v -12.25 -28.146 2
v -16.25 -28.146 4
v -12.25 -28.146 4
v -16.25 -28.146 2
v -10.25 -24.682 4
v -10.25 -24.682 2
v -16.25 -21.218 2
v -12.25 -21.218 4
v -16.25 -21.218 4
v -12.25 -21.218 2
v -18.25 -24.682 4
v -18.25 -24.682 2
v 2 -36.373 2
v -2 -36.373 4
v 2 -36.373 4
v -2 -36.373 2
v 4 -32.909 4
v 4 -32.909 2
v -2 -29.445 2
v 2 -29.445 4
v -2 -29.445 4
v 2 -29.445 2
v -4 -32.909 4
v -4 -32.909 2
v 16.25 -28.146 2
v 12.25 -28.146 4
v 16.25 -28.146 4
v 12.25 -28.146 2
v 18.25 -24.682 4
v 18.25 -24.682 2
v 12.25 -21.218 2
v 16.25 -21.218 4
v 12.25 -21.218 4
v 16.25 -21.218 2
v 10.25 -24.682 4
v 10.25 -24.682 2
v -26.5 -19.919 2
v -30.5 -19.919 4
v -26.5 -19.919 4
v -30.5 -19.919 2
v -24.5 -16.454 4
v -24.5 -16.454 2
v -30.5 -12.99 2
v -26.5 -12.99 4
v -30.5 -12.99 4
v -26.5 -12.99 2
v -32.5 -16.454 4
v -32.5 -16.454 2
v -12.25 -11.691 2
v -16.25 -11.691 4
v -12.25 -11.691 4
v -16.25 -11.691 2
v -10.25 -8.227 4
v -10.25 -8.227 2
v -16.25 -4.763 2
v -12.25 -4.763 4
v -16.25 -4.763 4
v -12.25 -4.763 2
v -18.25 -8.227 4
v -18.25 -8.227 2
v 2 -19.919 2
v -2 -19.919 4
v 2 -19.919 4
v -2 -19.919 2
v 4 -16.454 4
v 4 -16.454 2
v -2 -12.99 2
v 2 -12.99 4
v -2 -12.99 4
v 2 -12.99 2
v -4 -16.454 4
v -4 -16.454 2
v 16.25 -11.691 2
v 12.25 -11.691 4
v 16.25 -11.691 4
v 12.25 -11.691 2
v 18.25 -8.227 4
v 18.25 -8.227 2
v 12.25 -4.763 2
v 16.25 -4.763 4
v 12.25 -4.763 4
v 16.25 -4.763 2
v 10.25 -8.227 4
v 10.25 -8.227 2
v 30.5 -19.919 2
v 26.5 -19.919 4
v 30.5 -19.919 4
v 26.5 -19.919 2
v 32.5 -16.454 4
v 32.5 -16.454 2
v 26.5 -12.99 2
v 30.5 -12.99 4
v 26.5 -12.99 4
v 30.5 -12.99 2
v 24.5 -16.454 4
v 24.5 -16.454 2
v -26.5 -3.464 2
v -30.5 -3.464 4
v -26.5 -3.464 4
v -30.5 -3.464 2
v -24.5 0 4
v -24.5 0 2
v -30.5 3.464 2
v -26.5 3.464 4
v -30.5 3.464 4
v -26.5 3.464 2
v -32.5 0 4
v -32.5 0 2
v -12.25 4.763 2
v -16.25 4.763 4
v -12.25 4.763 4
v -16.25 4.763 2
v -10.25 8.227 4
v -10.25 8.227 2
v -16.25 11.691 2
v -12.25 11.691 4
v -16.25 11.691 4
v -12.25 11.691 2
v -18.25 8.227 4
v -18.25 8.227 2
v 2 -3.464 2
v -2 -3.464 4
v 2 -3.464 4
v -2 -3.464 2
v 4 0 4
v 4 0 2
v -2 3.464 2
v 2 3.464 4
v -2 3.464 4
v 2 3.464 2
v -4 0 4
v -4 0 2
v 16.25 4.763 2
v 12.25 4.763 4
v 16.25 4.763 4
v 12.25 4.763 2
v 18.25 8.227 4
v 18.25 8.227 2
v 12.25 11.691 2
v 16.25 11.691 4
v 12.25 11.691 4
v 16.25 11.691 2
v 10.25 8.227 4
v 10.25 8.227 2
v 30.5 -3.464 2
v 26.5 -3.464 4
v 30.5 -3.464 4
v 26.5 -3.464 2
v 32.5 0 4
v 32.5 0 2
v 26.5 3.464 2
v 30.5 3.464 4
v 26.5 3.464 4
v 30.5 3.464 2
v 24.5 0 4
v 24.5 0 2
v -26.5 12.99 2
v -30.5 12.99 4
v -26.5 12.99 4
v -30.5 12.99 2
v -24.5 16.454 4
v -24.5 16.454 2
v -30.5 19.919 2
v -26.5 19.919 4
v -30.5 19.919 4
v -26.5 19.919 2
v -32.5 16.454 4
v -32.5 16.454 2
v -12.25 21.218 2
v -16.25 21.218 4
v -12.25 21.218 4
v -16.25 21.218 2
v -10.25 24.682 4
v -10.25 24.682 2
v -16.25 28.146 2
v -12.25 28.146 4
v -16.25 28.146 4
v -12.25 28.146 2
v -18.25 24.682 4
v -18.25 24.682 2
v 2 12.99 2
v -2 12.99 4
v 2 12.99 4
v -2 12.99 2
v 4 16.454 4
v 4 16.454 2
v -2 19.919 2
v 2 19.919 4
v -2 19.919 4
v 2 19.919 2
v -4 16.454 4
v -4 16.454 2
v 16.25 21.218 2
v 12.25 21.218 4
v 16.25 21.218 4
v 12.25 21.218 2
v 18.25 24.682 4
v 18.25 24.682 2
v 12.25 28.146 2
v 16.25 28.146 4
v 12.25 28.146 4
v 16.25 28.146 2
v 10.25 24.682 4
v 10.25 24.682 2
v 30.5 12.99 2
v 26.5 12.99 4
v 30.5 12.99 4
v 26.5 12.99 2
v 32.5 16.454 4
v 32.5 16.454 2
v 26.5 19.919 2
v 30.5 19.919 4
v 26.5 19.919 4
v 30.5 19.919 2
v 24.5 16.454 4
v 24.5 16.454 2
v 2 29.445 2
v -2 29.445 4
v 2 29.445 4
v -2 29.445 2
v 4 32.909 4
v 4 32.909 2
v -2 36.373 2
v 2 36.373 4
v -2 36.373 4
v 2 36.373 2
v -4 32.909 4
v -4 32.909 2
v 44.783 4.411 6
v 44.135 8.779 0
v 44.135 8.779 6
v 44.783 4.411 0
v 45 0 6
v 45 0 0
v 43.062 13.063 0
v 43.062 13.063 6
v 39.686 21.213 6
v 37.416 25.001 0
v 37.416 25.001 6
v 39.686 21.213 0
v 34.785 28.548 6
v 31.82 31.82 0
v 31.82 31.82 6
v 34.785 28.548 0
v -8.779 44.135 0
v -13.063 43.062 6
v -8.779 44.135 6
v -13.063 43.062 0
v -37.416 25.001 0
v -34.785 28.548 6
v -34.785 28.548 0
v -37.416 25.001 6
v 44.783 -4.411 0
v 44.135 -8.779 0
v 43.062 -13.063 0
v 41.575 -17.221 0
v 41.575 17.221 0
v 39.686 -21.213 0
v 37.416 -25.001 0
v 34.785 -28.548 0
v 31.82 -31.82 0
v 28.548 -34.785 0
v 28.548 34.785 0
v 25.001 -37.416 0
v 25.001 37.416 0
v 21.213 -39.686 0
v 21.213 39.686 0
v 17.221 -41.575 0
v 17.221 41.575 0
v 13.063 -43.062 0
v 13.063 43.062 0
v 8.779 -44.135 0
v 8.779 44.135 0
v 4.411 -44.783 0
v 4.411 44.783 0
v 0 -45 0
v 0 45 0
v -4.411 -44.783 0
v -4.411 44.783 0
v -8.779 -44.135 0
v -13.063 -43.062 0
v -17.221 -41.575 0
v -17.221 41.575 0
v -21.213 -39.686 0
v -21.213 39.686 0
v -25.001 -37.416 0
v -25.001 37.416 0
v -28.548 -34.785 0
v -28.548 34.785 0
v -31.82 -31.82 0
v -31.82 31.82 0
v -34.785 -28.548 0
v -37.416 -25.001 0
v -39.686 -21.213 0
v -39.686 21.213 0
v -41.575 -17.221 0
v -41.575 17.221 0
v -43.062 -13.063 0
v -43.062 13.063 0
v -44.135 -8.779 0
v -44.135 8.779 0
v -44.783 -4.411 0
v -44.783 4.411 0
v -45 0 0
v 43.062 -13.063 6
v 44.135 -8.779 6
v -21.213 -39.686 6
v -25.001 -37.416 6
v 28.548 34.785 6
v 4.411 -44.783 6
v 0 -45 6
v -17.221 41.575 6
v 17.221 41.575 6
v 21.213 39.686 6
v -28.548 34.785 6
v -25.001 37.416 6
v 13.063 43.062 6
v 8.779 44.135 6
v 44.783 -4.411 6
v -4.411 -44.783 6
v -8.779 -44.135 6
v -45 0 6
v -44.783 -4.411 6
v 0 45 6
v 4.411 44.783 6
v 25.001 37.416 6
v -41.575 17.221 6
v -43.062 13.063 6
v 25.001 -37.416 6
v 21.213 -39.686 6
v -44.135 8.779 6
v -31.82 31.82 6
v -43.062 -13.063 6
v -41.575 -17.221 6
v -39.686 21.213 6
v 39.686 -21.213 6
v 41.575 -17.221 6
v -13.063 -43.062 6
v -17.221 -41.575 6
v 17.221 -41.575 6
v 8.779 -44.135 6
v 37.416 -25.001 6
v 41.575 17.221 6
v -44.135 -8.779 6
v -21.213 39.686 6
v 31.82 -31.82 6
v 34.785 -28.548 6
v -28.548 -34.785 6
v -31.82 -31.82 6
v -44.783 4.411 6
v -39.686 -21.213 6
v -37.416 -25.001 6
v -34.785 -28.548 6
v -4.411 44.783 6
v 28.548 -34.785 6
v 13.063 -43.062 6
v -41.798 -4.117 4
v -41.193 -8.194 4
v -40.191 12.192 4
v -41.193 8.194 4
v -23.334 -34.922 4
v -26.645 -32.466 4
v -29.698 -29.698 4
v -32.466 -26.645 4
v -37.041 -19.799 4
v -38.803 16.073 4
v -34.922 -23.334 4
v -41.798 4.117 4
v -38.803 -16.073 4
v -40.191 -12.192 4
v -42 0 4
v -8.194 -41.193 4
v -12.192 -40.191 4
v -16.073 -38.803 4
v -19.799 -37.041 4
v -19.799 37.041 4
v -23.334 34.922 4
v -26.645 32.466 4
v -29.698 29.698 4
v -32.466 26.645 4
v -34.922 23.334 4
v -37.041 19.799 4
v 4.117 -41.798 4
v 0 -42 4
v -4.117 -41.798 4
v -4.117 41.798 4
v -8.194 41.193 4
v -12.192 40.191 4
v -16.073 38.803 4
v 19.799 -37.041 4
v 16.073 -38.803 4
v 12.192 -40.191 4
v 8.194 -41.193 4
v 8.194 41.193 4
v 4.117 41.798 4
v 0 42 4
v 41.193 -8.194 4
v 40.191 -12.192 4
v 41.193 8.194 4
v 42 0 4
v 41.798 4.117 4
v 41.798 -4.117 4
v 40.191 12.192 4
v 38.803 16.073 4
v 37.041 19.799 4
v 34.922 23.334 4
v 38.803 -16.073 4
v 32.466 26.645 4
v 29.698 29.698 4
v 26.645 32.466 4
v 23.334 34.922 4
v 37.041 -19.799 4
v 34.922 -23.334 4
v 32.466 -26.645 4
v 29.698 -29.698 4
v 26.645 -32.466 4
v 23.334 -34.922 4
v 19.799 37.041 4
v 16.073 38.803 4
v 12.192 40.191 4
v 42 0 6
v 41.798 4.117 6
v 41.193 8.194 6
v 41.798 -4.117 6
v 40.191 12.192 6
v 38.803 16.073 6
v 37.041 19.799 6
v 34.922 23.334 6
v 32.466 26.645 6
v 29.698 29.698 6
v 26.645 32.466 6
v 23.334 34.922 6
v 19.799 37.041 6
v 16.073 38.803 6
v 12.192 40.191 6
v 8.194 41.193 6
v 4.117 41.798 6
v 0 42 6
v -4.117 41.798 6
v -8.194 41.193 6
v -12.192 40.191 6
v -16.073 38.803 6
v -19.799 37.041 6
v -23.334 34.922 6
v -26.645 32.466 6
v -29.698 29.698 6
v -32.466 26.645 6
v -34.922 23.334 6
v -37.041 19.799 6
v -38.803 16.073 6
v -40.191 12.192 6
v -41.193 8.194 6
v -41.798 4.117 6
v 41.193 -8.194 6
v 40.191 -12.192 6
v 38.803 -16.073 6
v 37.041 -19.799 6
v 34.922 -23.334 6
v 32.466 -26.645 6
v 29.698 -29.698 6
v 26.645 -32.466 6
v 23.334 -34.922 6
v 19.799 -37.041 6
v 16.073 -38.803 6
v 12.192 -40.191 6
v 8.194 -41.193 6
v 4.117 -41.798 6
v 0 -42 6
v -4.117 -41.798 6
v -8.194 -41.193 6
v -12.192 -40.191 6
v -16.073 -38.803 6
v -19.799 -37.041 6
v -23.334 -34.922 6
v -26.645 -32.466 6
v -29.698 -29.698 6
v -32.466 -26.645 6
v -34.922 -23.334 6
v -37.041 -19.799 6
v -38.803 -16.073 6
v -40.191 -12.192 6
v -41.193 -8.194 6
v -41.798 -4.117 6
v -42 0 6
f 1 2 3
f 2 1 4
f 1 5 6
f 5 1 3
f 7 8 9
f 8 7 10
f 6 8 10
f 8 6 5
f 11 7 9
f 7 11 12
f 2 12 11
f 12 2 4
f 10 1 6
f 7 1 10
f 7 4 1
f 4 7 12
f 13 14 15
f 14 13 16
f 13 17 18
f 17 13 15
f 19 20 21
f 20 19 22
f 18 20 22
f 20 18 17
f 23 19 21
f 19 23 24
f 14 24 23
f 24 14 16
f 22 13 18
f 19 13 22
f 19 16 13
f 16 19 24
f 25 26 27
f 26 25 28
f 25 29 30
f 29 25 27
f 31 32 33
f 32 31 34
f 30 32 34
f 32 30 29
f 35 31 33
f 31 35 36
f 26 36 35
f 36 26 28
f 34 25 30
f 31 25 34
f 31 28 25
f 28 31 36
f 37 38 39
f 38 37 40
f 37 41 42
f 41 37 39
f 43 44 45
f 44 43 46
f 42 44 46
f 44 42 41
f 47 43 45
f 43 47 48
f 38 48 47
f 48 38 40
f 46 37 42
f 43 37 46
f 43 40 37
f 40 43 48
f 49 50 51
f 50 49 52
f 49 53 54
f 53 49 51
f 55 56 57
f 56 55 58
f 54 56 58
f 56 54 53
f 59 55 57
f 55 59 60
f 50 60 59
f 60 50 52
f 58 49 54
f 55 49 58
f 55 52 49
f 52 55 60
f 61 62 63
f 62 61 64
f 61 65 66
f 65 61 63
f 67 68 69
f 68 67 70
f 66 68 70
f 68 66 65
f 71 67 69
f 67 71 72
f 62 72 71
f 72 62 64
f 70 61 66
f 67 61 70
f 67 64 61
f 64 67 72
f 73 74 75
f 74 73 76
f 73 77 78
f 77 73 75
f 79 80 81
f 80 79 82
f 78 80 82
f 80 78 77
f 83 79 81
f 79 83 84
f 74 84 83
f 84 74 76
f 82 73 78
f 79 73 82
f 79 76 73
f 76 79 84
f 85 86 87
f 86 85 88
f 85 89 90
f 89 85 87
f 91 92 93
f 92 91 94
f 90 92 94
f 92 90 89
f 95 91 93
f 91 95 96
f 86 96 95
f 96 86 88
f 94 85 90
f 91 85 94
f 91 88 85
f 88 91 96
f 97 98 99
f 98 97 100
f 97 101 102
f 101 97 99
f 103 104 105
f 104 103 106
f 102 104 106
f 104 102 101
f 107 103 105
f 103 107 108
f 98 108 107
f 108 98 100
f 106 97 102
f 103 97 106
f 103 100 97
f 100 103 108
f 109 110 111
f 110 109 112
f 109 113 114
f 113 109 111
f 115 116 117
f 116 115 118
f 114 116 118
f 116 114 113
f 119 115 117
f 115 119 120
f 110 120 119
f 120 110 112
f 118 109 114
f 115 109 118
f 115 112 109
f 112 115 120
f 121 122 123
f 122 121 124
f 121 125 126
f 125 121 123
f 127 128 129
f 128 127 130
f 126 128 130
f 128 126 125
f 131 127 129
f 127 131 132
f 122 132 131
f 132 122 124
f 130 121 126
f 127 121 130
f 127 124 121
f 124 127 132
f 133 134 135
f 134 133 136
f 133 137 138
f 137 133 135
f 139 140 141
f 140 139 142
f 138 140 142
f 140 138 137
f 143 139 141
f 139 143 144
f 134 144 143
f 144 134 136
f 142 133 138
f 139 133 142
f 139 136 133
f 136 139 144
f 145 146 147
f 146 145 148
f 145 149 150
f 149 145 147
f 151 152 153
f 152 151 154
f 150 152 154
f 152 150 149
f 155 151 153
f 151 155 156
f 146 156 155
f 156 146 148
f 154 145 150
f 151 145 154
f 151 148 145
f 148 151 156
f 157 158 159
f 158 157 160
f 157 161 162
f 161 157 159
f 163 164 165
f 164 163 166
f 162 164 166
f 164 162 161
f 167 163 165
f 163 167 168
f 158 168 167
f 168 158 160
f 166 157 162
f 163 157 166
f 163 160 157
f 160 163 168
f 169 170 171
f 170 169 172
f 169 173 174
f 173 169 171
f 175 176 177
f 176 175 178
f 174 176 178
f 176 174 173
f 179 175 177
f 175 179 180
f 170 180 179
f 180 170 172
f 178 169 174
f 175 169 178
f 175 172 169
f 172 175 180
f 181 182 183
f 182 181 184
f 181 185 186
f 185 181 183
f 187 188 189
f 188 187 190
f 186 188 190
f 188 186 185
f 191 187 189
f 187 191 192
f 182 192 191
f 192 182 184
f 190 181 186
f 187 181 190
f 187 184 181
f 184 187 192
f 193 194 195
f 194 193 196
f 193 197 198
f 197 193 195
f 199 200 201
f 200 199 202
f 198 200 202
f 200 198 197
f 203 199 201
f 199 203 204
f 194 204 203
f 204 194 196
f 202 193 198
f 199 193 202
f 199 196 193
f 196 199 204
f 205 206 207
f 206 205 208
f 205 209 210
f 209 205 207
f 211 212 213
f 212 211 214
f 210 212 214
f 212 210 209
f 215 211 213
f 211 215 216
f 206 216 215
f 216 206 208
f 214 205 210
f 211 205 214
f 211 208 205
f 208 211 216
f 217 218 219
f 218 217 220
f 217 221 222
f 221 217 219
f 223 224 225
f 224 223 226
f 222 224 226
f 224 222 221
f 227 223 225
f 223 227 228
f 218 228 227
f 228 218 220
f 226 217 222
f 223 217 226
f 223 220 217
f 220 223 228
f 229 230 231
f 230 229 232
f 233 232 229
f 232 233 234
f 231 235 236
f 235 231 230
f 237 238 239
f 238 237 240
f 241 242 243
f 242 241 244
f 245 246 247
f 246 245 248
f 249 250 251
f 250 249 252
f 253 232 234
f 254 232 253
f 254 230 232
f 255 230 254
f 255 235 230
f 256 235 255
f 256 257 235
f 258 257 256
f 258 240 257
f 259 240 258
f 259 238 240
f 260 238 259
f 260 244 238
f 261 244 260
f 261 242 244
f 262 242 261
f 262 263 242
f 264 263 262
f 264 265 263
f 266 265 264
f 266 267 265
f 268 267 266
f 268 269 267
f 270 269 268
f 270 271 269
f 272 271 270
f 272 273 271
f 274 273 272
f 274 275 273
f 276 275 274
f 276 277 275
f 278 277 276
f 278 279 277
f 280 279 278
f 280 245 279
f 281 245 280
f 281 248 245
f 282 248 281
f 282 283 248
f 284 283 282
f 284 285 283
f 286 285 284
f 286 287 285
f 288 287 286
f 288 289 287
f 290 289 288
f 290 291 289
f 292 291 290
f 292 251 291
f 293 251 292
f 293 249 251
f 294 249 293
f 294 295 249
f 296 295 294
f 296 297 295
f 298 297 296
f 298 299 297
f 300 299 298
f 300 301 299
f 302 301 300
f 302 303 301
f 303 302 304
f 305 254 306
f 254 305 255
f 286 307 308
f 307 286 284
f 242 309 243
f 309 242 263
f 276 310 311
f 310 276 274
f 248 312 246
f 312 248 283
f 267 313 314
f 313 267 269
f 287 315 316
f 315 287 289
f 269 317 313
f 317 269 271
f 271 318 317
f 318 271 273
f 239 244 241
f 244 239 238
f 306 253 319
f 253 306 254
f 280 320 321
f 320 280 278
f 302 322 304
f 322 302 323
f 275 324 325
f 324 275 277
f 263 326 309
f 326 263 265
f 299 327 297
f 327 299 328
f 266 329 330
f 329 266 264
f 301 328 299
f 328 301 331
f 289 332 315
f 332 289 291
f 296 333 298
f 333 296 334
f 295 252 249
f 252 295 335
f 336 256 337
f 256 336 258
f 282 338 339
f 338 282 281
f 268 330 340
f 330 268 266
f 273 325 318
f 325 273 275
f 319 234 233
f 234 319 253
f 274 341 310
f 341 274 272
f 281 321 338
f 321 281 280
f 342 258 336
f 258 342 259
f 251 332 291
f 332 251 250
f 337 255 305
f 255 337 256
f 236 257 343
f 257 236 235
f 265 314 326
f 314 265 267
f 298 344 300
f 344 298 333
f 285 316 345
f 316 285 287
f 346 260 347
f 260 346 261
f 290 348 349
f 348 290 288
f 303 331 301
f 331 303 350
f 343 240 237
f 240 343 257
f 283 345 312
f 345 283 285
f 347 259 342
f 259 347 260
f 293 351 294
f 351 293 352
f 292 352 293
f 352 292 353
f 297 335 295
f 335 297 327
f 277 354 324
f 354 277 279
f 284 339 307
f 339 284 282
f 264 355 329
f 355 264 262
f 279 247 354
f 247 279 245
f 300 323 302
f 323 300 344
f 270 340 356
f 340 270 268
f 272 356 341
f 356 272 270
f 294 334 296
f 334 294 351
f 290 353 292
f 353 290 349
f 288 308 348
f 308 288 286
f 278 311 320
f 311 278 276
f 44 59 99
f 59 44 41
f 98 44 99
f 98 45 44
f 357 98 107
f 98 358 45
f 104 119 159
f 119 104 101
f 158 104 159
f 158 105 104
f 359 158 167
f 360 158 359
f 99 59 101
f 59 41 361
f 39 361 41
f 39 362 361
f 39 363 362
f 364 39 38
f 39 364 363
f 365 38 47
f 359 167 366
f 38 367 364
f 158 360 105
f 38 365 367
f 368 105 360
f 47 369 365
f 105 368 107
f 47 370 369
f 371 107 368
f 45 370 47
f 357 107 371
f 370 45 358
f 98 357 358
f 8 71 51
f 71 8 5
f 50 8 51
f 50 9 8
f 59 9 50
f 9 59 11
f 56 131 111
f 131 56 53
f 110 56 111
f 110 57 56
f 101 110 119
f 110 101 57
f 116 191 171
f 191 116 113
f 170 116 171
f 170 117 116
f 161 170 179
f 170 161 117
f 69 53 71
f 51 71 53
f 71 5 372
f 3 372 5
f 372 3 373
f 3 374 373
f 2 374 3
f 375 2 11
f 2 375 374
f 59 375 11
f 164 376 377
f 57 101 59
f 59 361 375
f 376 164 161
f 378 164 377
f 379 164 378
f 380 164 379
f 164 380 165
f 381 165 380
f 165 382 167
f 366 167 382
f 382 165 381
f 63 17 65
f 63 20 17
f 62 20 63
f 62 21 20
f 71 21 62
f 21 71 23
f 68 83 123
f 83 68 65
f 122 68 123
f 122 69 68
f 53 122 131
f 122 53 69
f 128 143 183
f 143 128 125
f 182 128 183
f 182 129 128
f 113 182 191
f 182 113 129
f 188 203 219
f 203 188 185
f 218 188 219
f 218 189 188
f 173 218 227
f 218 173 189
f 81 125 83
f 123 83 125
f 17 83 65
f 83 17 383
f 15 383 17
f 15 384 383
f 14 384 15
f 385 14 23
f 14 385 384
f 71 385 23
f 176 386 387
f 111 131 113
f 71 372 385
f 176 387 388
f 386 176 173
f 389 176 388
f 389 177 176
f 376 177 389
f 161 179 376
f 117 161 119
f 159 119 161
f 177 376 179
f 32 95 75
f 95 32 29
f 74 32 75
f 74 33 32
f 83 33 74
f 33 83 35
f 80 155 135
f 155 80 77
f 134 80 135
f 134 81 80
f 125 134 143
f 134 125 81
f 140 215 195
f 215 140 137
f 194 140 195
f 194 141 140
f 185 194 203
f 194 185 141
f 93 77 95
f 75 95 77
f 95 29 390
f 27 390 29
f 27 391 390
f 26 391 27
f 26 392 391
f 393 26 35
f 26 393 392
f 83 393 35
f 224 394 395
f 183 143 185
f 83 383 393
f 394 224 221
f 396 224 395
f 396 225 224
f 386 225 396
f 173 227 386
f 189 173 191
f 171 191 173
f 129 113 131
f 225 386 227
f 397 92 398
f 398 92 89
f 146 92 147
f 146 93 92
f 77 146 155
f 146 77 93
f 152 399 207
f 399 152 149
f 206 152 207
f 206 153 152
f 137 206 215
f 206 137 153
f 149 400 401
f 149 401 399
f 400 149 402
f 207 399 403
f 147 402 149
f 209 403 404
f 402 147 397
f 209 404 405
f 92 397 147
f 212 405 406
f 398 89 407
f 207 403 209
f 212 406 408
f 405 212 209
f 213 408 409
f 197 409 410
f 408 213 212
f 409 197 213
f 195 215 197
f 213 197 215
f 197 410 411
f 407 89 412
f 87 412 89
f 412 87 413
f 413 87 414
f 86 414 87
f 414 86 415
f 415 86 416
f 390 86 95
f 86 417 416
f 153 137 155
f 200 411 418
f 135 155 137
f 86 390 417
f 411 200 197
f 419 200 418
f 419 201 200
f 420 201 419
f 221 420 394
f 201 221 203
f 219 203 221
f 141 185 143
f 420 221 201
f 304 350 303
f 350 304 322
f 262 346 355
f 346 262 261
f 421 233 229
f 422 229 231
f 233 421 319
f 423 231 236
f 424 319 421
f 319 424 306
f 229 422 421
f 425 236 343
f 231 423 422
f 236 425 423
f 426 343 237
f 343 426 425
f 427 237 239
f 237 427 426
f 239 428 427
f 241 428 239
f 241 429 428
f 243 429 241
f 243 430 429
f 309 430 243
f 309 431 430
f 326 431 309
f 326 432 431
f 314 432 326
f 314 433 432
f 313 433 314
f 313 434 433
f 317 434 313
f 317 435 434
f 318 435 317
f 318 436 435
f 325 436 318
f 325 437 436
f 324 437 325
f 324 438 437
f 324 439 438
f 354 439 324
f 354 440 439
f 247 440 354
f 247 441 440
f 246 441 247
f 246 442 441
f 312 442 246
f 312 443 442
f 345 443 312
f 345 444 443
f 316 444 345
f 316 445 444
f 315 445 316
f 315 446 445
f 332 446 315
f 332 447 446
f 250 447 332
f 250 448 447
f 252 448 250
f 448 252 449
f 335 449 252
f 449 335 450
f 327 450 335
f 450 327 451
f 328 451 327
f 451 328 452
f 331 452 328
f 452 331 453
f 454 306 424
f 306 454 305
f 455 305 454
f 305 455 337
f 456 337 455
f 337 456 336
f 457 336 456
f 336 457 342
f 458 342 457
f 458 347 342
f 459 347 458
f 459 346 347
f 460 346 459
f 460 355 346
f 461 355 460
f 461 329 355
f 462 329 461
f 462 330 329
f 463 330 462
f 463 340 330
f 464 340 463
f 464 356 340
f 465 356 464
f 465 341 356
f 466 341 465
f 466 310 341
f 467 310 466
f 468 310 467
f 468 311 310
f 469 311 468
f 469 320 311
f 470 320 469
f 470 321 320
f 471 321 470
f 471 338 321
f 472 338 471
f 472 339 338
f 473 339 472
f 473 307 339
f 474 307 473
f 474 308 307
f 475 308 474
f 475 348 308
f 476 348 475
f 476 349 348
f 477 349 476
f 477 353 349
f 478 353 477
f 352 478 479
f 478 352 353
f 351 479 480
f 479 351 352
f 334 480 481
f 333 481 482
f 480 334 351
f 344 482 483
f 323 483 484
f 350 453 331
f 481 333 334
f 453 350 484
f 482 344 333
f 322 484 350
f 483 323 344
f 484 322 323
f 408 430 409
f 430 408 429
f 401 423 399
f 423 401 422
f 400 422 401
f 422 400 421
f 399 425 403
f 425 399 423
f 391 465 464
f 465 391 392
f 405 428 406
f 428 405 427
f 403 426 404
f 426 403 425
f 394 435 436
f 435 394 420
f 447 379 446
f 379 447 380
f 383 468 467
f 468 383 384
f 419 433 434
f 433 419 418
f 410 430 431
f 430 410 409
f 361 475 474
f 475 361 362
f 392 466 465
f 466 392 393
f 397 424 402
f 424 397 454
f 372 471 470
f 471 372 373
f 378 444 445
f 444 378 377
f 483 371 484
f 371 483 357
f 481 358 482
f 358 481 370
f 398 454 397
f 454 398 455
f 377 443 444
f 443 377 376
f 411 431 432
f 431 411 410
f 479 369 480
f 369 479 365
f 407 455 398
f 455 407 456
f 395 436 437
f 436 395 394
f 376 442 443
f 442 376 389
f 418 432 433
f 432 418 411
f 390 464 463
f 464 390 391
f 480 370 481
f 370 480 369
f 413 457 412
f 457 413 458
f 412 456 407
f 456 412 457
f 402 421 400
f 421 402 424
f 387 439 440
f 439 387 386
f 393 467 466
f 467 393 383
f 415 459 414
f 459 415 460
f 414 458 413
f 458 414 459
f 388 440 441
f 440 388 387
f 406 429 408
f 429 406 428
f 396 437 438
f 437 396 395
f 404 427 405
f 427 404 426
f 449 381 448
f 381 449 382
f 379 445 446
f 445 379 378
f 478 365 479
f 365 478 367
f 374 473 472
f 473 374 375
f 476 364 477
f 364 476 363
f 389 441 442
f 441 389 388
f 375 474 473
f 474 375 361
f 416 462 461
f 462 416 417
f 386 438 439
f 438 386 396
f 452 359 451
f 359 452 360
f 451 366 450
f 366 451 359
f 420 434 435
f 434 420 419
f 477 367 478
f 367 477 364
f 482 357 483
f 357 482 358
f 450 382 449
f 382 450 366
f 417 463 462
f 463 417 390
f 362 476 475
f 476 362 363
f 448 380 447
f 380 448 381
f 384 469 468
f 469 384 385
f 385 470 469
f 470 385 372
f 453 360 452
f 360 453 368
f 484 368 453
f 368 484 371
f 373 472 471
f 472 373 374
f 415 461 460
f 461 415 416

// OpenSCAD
// Vorea Studio — Parametric Honeycomb Coaster
// Hexagonal pattern coaster with raised rim
// Compatible: Vorea Studio SCAD Engine

// [Section: Dimensions]
diameter = 90;      // [60:5:120] Diametro total (mm)
height = 4;         // [2:1:8] Altura total (mm)
rim_height = 2;     // [0:0.5:4] Altura del borde elevado
rim_width = 3;      // [2:1:6] Ancho del borde

// [Section: Pattern]
hex_size = 8;       // [4:1:15] Tamano de cada hexagono (mm)
hex_wall = 1.5;     // [0.8:0.2:3] Grosor de las paredes hexagonales
hex_depth = 2;      // [1:0.5:4] Profundidad del patron

$fn = 6;  // Hexagons!

r = diameter / 2;

// Base disc
difference() {
  // Solid base
  cylinder(r = r, h = height, $fn = 64);
  
  // Honeycomb cutouts
  dx = (hex_size + hex_wall) * 1.5;
  dy = (hex_size + hex_wall) * sin(60) * 2;
  
  for (row = [-6 : 6]) {
    for (col = [-6 : 6]) {
      x = col * dx;
      y = row * dy + (col % 2 == 0 ? 0 : dy / 2);
      dist = sqrt(x*x + y*y);
      
      if (dist < r - rim_width - hex_size) {
        translate([x, y, height - hex_depth])
          cylinder(r = hex_size / 2, h = hex_depth + 1, $fn = 6);
      }
    }
  }
}

// Raised rim
if (rim_height > 0) {
  difference() {
    cylinder(r = r, h = height + rim_height, $fn = 64);
    translate([0, 0, -0.1])
      cylinder(r = r - rim_width, h = height + rim_height + 0.2, $fn = 64);
  }
}
